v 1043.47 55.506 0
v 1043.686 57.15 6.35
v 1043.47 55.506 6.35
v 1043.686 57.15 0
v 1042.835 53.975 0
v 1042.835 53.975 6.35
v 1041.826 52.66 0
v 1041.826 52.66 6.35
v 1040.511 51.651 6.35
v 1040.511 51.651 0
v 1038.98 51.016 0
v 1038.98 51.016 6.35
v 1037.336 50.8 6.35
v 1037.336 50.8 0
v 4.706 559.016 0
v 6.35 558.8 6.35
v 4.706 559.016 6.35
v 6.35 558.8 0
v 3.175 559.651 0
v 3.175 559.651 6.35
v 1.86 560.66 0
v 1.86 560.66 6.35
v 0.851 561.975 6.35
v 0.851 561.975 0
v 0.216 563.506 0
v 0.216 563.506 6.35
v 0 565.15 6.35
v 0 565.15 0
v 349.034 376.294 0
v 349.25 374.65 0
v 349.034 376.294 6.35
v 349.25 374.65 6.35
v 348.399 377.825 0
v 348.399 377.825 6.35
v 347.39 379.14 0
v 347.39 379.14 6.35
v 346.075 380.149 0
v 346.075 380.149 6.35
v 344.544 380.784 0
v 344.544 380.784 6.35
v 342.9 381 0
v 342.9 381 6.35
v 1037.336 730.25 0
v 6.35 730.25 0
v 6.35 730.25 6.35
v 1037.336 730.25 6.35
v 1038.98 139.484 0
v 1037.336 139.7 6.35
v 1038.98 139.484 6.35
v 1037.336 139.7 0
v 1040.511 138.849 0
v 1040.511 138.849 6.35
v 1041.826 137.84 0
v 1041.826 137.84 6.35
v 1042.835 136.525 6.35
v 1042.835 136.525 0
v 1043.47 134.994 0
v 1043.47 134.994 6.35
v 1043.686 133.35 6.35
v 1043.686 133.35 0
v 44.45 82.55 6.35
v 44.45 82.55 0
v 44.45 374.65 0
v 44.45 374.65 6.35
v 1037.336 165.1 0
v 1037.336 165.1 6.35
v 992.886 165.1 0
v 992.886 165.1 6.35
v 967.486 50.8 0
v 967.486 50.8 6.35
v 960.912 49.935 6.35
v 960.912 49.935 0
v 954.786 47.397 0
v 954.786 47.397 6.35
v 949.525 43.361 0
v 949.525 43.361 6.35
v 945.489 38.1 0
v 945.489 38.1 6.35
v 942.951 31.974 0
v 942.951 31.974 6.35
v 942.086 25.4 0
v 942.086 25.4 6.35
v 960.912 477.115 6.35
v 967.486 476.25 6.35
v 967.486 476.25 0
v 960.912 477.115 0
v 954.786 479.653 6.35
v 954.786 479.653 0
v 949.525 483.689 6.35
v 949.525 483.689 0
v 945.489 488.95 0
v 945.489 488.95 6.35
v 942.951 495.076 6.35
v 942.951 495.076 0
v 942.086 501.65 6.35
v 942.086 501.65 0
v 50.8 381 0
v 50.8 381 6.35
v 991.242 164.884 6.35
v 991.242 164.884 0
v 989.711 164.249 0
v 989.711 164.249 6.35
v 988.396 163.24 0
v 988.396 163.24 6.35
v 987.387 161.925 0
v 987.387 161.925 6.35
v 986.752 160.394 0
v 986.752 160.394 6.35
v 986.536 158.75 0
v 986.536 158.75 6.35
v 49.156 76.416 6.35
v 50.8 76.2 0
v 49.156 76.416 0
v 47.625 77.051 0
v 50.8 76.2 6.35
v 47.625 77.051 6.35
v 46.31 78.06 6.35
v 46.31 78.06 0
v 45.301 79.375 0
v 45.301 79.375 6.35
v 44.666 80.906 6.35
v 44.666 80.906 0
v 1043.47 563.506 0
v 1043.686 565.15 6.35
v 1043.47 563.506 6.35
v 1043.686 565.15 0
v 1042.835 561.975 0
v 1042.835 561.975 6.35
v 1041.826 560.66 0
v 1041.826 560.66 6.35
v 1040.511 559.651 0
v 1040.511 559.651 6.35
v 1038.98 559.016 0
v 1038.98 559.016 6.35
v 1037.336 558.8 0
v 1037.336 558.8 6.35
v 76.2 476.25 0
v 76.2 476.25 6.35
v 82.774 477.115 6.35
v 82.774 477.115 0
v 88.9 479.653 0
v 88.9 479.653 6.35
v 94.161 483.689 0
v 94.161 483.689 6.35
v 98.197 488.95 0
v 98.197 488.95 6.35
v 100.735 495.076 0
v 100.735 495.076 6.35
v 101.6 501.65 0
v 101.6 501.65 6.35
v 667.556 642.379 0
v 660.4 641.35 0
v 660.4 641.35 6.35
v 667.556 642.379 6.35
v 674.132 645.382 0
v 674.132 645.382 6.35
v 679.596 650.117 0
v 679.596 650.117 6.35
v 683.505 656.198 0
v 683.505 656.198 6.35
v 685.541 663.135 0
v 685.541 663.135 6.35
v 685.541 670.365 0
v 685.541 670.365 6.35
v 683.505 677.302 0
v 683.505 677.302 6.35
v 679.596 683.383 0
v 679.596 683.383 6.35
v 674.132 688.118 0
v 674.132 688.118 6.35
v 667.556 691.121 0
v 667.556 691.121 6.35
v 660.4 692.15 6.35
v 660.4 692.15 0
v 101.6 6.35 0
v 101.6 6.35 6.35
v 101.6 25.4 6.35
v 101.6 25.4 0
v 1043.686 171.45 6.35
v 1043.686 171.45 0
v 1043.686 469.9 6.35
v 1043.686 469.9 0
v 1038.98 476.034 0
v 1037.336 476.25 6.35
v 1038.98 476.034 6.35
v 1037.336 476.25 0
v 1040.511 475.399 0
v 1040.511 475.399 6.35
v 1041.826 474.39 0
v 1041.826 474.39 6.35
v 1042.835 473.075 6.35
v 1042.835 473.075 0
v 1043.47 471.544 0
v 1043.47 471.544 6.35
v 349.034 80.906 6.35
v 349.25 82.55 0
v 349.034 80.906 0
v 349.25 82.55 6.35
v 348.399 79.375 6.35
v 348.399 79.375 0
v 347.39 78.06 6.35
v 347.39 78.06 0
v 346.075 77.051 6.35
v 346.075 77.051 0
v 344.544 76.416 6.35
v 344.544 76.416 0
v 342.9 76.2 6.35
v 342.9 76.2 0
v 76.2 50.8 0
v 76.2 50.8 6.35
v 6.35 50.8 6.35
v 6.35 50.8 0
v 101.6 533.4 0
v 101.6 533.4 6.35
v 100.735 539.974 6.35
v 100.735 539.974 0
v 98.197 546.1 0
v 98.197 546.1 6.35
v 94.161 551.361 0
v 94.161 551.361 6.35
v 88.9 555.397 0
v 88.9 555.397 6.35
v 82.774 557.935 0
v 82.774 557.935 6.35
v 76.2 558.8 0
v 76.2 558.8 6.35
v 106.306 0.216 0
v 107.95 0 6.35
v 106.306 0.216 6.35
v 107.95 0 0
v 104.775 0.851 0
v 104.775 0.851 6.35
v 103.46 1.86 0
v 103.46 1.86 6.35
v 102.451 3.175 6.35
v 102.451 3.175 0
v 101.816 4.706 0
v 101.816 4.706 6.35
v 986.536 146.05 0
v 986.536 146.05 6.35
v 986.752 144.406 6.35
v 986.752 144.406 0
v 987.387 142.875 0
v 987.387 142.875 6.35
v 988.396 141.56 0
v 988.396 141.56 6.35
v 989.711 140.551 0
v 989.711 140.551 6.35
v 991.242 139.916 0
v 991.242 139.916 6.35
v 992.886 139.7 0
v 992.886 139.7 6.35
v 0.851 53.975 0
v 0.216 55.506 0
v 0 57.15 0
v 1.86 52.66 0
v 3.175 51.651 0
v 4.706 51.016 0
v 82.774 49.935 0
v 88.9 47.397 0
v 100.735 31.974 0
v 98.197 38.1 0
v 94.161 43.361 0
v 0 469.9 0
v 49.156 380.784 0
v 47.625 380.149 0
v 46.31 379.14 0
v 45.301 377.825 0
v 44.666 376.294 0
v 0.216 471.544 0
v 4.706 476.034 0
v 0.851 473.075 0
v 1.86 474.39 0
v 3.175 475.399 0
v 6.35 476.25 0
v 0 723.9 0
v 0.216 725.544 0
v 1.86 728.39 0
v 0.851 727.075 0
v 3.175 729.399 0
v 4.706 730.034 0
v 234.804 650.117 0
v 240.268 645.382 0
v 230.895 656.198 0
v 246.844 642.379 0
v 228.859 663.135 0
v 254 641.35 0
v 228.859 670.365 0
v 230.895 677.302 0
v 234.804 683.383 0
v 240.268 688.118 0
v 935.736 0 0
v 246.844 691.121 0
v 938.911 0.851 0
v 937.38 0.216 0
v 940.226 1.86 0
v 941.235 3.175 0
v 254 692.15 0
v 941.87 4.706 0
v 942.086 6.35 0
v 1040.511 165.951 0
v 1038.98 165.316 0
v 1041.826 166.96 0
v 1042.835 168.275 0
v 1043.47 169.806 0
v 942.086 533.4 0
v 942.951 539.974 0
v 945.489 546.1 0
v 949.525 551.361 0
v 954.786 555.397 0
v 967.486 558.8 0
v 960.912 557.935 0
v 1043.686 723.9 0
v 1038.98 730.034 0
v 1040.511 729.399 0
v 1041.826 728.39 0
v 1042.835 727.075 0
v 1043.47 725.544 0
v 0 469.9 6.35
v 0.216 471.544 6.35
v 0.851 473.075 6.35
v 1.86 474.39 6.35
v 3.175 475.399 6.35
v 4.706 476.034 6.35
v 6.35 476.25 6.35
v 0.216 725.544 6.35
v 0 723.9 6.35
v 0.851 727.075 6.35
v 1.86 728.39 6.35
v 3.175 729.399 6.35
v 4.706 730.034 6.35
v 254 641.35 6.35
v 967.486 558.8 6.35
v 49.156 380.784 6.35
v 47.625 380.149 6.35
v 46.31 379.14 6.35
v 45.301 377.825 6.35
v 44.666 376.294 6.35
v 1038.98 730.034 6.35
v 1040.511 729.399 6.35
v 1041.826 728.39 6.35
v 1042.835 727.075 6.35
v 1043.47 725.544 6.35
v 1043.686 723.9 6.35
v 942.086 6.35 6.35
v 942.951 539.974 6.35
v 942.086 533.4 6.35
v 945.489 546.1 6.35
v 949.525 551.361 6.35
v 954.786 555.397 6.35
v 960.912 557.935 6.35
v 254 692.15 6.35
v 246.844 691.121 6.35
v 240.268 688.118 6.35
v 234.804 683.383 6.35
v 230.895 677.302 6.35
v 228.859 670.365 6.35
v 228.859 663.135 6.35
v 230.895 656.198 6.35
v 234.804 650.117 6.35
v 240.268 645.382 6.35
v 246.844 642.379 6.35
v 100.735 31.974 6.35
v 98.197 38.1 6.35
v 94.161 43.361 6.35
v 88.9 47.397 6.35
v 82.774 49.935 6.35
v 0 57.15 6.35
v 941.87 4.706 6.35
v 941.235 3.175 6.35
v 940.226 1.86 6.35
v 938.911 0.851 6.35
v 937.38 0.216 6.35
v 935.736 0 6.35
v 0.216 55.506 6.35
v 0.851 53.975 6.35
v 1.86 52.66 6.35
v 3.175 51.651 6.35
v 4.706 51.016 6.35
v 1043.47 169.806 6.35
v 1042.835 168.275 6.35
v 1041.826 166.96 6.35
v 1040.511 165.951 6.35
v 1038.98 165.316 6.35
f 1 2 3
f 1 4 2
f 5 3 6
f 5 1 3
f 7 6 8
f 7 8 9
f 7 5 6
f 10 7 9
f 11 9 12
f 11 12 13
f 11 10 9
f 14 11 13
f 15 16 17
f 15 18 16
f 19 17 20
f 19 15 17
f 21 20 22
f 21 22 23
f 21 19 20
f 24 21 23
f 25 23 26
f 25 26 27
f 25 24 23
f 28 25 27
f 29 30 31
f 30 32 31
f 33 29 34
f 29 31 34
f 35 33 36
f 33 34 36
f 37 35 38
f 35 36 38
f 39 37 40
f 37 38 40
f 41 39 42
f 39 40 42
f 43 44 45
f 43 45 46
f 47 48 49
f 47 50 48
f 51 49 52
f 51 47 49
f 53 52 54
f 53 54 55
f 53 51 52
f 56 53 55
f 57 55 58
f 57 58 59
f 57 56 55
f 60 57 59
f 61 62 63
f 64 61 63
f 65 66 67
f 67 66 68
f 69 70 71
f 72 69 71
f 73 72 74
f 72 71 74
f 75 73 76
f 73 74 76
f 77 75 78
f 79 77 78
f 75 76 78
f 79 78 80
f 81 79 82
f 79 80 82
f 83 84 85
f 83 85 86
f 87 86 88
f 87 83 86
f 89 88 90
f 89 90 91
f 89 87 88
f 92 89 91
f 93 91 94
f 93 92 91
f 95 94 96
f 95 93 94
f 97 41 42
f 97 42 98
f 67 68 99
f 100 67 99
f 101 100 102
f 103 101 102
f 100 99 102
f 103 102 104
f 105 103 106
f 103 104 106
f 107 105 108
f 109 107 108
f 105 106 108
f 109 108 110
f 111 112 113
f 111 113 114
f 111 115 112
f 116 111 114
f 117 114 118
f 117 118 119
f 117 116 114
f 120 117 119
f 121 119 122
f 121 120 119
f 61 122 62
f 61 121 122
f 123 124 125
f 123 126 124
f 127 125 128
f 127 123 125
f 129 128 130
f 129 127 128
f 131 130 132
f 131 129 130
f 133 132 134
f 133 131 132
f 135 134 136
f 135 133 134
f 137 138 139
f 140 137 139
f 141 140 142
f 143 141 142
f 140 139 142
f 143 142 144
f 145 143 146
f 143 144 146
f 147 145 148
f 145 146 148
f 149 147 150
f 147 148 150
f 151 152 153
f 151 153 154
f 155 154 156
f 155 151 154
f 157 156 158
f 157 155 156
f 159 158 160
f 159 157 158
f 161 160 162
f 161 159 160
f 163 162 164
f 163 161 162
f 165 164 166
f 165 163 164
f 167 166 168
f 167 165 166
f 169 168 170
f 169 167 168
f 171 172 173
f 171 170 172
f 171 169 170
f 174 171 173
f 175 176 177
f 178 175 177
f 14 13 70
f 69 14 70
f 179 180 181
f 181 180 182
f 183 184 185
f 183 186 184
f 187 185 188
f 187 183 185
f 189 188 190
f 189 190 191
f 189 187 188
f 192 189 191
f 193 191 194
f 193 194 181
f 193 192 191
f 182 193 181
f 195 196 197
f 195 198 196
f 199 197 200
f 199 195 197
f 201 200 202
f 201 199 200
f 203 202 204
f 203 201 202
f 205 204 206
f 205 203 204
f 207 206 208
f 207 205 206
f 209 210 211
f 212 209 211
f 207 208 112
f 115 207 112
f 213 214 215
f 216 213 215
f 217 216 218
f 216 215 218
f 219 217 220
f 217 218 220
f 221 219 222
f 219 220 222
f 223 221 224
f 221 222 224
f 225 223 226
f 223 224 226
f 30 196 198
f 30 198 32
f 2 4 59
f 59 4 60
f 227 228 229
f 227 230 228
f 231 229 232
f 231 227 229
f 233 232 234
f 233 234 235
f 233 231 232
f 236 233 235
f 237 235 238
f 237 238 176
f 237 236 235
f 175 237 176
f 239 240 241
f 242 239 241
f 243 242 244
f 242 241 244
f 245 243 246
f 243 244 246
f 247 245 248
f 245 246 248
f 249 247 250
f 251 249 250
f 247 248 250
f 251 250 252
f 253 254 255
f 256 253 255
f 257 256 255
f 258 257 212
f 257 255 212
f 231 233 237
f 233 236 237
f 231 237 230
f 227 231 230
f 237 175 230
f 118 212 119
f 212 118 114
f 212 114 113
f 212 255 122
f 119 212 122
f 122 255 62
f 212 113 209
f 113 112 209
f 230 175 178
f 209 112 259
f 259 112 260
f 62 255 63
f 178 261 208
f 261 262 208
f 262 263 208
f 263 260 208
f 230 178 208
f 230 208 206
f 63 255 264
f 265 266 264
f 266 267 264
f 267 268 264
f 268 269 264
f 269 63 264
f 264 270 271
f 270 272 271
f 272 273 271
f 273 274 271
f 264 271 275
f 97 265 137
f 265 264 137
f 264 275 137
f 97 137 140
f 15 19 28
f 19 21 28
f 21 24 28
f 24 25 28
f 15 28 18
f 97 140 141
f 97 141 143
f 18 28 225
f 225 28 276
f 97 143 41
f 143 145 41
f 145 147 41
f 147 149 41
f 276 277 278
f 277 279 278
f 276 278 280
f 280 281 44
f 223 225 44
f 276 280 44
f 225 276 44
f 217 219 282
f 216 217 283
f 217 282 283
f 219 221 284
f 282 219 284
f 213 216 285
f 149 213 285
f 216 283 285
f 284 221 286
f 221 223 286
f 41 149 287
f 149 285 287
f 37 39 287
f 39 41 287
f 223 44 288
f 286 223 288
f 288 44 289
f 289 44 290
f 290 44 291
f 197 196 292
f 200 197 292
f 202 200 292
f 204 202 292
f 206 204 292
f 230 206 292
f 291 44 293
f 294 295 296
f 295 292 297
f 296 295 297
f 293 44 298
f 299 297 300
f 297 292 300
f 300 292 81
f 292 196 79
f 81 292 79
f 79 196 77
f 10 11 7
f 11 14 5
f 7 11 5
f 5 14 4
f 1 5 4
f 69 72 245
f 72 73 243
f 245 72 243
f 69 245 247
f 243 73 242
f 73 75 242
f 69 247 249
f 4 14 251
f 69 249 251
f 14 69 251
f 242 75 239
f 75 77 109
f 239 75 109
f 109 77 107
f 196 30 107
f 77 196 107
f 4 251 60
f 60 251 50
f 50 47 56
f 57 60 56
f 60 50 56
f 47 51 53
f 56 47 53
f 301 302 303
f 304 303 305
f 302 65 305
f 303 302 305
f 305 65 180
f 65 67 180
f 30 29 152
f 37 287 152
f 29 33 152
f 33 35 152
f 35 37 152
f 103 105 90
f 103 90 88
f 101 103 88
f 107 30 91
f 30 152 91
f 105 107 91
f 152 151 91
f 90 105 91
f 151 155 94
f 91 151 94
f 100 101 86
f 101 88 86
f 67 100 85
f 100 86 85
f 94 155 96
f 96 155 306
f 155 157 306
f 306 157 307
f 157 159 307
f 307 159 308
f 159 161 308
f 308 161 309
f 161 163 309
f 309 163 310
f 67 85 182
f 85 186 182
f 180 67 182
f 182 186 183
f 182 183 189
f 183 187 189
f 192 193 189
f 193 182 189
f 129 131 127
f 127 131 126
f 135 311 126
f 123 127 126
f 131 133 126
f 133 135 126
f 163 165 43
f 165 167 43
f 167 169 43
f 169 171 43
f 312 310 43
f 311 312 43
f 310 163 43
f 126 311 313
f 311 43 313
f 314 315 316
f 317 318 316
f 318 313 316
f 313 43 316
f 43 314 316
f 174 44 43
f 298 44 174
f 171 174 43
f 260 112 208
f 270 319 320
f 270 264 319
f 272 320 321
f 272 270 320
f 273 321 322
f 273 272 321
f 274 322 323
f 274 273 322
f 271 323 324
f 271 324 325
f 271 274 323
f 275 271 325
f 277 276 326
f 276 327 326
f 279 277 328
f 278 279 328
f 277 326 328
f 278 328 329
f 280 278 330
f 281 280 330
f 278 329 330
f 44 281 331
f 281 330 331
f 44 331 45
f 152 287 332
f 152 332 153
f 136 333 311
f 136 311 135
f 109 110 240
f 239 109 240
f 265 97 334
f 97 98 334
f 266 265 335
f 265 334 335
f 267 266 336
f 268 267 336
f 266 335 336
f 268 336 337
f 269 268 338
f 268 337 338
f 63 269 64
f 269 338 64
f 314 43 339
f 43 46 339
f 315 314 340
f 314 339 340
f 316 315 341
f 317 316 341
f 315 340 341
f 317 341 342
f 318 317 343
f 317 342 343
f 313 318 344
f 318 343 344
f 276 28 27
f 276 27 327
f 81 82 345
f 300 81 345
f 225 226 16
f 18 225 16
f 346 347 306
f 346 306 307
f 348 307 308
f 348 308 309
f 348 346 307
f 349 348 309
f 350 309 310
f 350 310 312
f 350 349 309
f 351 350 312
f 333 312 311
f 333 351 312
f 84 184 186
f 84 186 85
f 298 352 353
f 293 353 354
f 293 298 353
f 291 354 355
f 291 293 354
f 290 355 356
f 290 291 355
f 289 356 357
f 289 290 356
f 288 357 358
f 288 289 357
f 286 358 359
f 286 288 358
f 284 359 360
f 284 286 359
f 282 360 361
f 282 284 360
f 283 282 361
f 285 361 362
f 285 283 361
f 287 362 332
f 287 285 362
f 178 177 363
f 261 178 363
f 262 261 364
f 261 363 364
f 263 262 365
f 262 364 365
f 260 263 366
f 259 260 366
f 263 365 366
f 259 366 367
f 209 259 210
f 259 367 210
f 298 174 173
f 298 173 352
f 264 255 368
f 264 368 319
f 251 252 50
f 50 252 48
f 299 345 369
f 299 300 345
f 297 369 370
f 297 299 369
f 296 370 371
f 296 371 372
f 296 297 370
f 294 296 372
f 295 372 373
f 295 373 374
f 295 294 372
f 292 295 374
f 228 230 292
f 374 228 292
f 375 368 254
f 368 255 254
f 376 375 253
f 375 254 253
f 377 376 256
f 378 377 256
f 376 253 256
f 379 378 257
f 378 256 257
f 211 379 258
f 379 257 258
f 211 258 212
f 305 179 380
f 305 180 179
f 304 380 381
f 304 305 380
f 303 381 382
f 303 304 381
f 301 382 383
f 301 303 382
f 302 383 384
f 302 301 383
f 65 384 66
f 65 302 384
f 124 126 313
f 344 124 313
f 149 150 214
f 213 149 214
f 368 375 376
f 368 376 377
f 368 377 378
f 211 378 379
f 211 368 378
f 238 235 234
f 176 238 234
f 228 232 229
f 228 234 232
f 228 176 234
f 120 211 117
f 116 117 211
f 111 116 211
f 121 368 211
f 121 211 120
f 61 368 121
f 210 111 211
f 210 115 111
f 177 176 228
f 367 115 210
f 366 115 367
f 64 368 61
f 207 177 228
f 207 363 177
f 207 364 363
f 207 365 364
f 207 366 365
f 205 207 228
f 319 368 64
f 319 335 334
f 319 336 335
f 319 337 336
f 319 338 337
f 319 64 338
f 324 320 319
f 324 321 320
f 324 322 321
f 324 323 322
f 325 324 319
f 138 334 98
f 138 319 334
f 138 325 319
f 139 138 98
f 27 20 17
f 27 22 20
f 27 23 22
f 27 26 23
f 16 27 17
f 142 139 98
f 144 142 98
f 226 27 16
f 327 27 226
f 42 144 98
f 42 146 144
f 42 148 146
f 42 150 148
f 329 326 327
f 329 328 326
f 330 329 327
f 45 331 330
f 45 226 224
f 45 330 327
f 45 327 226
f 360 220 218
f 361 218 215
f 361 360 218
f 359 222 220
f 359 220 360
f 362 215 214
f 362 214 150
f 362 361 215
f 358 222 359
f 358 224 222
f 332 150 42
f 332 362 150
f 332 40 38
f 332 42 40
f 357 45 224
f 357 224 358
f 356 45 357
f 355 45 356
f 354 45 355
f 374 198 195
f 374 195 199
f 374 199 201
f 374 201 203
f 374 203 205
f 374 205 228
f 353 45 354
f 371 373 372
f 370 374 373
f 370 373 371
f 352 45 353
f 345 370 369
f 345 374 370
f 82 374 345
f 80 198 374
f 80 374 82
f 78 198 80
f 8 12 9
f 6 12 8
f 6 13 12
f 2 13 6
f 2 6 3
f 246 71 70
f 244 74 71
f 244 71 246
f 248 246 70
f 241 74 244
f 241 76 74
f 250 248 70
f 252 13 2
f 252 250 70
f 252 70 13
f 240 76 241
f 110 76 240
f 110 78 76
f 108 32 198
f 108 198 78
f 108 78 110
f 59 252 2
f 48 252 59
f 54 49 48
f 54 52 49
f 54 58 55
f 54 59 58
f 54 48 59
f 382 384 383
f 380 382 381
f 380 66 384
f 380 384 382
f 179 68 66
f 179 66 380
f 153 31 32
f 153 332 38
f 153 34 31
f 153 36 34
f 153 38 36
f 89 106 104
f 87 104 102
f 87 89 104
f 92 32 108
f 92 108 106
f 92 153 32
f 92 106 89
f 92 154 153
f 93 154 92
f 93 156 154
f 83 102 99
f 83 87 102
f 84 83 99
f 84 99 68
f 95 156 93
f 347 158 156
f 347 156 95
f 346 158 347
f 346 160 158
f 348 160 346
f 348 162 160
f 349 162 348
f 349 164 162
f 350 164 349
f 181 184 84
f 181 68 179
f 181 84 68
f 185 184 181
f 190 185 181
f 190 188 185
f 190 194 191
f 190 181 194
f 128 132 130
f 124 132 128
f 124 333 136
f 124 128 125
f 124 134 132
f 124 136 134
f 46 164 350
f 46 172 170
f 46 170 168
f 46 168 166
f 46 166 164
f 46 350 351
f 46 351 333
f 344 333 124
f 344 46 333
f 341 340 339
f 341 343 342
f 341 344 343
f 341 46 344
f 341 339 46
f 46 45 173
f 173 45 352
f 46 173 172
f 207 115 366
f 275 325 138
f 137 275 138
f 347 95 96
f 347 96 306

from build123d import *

# Parameters (mm, degrees)
SKETCH1_W           = 1043.686
SKETCH1_H           = 730.25
BOSS_EXTRUDE1_DEPTH = 6.35
SKETCH9_W           = 304.8
SKETCH9_H           = 304.8
CUT_EXTRUDE3_DEPTH  = 6.35
CUT_EXTRUDE4_DEPTH  = 6.35
FILLET1_R           = 6.35
CUT_EXTRUDE6_DEPTH  = 7.35


with BuildPart() as part:
    # Sketch1 → Boss-Extrude1 (new body)
    with BuildSketch(Plane.XY):
        with Locations((521.843, 365.125)):
            Rectangle(SKETCH1_W, SKETCH1_H)
    extrude(amount=BOSS_EXTRUDE1_DEPTH)

    # Sketch9 → Cut-Extrude3 (cut)
    with BuildSketch(Plane(origin=(0, 0, 0), x_dir=(-1, 0, 0), z_dir=(0, 0, -1))):
        with Locations((-196.85, 228.6)):
            Rectangle(SKETCH9_W, SKETCH9_H)
    extrude(amount=-CUT_EXTRUDE3_DEPTH, mode=Mode.SUBTRACT)

    # Sketch10 → Cut-Extrude4 (cut)
    with BuildSketch(Plane.XY.offset(6.35)):
        with BuildLine():
            Line((76.2, 50.8), (0, 50.8))
            Line((0, 50.8), (0, 0))
            Line((0, 0), (101.6, 0))
            Line((101.6, 0), (101.6, 25.4))
            ThreePointArc((101.6, 25.4), (94.160512242, 43.360512242), (76.2, 50.8))
        make_face()
        with BuildLine():
            Line((942.086, 25.4), (942.086, 0))
            Line((942.086, 0), (1043.686, 0))
            Line((1043.686, 0), (1043.686, 50.8))
            Line((1043.686, 50.8), (967.486, 50.8))
            ThreePointArc((967.486, 50.8), (949.525487758, 43.360512242), (942.086, 25.4))
        make_face()
        with BuildLine():
            Line((967.486, 558.8), (1043.686, 558.8))
            Line((1043.686, 558.8), (1043.686, 476.25))
            Line((1043.686, 476.25), (967.486, 476.25))
            ThreePointArc((967.486, 476.25), (949.525487758, 483.689487758), (942.086, 501.65))
            Line((942.086, 501.65), (942.086, 533.4))
            ThreePointArc((942.086, 533.4), (949.525487758, 551.360512242), (967.486, 558.8))
        make_face()
        with BuildLine():
            Line((76.2, 558.8), (0, 558.8))
            Line((0, 558.8), (0, 476.25))
            Line((0, 476.25), (76.2, 476.25))
            ThreePointArc((76.2, 476.25), (94.160512242, 483.689487758), (101.6, 501.65))
            Line((101.6, 501.65), (101.6, 533.4))
            ThreePointArc((101.6, 533.4), (94.160512242, 551.360512242), (76.2, 558.8))
        make_face()
        with BuildLine():
            Line((1043.686, 139.7), (1043.686, 165.1))
            Line((1043.686, 165.1), (992.886, 165.1))
            ThreePointArc((992.886, 165.1), (988.395871939, 163.240128061), (986.536, 158.75))
            Line((986.536, 158.75), (986.536, 146.05))
            ThreePointArc((986.536, 146.05), (988.395871939, 141.559871939), (992.886, 139.7))
            Line((992.886, 139.7), (1043.686, 139.7))
        make_face()
    extrude(amount=-CUT_EXTRUDE4_DEPTH, mode=Mode.SUBTRACT)

    # Fillet1
    fillet1_edges = [part.edges().sort_by_distance(p)[0] for p in [
        (349.25, 76.2, 3.175),
        (349.25, 381, 3.175),
        (44.45, 381, 3.175),
        (44.45, 76.2, 3.175),
        (1043.686, 558.8, 3.175),
        (1043.686, 476.25, 3.175),
        (1043.686, 50.8, 3.175),
        (942.086, 0, 3.175),
        (0, 476.25, 3.175),
        (0, 558.8, 3.175),
        (0, 730.25, 3.175),
        (1043.686, 730.25, 3.175),
        (1043.686, 139.7, 3.175),
        (1043.686, 165.1, 3.175),
        (101.6, 0, 3.175),
        (0, 50.8, 3.175),
    ]]
    fillet(fillet1_edges, radius=FILLET1_R)

    # Sketch14 → Cut-Extrude6 (cut, through all)
    with BuildSketch(Plane(origin=(0, 0, 0), x_dir=(-1, 0, 0), z_dir=(0, 0, -1))):
        with BuildLine():
            Line((-660.4, 692.15), (-254, 692.15))
            ThreePointArc((-254, 692.15), (-228.6, 666.75), (-254, 641.35))
            Line((-254, 641.35), (-660.4, 641.35))
            ThreePointArc((-660.4, 641.35), (-685.8, 666.75), (-660.4, 692.15))
        make_face()
    extrude(amount=-CUT_EXTRUDE6_DEPTH, mode=Mode.SUBTRACT)


solid = part.part
